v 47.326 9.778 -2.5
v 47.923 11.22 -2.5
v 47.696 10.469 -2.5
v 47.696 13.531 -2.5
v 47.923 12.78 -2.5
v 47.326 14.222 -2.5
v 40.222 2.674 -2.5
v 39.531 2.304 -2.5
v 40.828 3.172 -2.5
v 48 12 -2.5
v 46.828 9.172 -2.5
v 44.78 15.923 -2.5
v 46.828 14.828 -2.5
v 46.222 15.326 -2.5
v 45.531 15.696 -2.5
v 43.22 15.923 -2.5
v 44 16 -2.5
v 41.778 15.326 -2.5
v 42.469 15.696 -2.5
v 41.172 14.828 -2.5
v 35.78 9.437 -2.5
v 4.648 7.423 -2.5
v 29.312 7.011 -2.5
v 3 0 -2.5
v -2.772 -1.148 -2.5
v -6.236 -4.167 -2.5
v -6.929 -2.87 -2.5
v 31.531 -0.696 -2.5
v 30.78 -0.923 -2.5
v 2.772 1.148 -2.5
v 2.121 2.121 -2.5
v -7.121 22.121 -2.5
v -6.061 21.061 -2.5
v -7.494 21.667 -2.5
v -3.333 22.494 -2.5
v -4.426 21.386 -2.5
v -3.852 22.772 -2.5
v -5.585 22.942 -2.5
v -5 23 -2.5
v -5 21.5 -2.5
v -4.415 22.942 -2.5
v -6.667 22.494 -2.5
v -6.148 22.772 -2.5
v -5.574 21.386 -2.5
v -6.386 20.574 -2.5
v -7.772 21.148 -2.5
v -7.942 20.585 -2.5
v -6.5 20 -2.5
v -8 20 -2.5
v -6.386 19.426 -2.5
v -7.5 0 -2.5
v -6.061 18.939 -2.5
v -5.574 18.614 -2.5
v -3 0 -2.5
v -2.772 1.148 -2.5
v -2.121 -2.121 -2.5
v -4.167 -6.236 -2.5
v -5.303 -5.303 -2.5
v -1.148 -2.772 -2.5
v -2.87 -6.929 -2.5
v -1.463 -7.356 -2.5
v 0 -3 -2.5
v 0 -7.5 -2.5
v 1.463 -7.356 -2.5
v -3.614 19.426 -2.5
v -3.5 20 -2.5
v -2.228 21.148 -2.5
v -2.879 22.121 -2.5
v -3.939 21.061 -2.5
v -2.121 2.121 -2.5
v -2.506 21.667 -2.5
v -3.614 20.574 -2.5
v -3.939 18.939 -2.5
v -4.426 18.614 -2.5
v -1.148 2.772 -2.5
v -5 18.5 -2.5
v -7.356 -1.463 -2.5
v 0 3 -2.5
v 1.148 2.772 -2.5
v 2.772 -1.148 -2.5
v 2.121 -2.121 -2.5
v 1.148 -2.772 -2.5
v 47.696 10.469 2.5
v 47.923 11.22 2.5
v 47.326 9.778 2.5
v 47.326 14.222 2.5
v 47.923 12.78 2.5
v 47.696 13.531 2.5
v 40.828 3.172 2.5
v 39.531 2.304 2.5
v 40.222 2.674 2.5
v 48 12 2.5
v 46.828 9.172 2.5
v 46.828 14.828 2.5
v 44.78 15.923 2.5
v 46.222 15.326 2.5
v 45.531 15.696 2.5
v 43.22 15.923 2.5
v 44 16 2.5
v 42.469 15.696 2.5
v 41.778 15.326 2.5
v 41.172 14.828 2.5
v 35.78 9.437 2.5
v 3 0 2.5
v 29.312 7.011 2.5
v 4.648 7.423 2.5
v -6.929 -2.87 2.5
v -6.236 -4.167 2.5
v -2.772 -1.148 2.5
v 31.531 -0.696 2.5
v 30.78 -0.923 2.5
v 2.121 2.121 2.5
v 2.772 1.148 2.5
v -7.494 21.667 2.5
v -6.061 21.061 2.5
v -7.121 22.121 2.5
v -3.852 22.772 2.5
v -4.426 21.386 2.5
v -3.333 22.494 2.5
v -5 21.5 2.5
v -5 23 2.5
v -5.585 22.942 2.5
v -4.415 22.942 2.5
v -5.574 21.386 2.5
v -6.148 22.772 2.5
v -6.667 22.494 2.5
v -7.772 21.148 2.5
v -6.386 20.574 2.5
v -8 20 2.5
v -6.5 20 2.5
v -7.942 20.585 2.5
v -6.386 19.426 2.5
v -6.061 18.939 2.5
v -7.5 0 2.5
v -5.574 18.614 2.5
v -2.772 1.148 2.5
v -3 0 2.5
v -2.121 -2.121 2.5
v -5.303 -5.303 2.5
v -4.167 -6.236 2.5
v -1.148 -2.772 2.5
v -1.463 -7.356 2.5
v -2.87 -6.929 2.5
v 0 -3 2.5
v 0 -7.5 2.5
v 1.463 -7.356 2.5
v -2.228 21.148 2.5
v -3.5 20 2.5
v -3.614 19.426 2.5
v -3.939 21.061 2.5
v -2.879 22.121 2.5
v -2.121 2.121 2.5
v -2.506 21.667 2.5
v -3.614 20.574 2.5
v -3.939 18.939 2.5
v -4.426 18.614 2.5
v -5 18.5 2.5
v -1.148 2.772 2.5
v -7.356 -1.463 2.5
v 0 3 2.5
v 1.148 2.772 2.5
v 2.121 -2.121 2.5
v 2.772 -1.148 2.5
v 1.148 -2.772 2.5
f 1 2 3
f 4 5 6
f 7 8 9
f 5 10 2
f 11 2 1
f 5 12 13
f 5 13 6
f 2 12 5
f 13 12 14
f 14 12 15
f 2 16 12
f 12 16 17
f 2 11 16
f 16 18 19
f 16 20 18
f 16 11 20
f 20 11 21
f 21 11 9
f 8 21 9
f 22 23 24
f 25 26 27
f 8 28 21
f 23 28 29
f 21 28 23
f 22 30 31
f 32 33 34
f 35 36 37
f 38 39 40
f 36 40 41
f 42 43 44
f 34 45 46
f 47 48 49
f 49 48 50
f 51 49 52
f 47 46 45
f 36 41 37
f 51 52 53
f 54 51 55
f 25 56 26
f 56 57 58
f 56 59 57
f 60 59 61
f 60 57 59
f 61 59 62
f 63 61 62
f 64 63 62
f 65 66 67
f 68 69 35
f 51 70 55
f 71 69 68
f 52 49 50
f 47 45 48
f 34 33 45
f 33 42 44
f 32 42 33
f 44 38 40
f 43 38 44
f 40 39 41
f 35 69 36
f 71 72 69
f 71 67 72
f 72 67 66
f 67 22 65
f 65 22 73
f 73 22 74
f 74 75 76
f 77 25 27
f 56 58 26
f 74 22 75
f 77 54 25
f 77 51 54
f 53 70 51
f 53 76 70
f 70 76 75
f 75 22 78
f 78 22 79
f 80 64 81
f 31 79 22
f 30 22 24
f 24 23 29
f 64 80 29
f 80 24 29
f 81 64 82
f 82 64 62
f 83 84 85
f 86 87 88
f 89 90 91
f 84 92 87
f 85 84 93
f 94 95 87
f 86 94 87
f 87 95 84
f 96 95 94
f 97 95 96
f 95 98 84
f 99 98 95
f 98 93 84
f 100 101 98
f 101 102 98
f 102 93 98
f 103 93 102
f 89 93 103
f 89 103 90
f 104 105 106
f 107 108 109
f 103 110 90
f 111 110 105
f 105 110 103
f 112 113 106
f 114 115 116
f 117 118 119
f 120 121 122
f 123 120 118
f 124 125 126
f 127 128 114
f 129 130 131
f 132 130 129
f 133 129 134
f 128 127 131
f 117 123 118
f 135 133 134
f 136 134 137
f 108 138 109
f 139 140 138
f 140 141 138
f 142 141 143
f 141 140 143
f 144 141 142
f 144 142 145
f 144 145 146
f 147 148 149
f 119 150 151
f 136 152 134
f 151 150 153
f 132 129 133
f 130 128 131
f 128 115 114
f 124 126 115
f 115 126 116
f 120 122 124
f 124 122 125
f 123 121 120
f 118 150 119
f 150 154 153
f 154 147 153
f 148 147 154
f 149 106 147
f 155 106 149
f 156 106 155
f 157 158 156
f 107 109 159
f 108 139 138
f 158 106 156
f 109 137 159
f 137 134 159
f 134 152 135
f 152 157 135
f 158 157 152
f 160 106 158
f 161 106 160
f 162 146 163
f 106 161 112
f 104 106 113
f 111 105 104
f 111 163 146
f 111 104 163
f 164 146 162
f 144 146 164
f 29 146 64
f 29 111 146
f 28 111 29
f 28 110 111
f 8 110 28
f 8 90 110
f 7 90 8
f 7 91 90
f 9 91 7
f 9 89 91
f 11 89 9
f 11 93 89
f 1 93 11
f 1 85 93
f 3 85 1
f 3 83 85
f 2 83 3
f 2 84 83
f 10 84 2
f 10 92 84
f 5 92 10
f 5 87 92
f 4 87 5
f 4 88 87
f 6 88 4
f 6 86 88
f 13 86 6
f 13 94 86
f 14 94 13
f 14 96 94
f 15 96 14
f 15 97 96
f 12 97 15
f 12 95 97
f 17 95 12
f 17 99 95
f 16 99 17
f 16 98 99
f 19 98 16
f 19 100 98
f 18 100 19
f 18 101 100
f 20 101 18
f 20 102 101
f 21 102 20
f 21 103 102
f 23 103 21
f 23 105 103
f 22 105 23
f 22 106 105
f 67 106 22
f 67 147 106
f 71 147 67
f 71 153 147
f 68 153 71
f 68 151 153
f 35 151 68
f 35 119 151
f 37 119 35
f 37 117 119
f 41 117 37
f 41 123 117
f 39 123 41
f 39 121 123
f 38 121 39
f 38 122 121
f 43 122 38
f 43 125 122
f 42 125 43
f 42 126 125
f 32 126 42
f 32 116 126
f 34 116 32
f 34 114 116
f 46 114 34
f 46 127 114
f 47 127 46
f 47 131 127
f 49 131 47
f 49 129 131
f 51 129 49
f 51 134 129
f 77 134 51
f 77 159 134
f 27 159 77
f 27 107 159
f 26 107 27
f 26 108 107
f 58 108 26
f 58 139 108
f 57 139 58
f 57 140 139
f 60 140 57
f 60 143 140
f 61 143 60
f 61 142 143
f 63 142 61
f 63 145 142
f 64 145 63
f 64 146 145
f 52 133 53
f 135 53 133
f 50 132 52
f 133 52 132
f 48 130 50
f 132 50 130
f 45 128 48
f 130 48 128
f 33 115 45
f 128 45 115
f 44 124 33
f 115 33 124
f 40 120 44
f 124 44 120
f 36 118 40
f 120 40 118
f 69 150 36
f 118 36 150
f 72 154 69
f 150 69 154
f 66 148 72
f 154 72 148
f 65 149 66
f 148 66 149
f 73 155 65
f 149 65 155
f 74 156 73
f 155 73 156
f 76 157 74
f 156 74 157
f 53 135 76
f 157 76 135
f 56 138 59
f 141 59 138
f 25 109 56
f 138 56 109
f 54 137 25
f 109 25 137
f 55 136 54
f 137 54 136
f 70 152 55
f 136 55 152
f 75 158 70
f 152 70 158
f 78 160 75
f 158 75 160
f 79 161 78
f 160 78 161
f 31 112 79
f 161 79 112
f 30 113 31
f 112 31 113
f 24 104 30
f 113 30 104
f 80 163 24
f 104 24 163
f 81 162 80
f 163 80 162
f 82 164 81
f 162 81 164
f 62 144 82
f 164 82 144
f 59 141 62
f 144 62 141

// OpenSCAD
// file: config.scad
lever_thickness = 5;
layer_spacing = 4;

mount_thickness = 6;

pot_shaft_diameter = 6;
pot_mount_diameter = 8;

mount_screw_diameter = 3.5;
mount_screw_cutout_diameter = 5;
// file: lever.scad
include <config.scad>;

module HullPart(pa, pb, da, db)
{
  hull()
  {
    translate(pa)
    {
      circle(d=da, $fn=32);
    }

    translate(pb)
    {
      circle(d=db, $fn=32);
    }
  }
}

module Lever()
{
  pq = [-5, 20];
  pa = [0, 0];
  pb = [30, 3];
  pc = [38, 6];
  pd = [44, 12];

  dq = 6;
  da = 15;
  db = 8;
  dc = 8;
  dd = 8;

  difference()
  {
    union()
    {
      HullPart(pa, pq, da, dq);
      HullPart(pa, pb, da, db);
      HullPart(pb, pc, db, dc);
      HullPart(pc, pd, dc, dd);
    }

    translate(pa)
    {
      circle(d=pot_shaft_diameter, $fn=16);
    }

    translate(pq)
    {
      circle(d=3, $fn=16);
    }
  }
}

Lever();
// main file
use <lever.scad>;
include <config.scad>;

module Lever3D()
{
  linear_extrude(lever_thickness, center=true)
  {
    Lever();
  }
}

Lever3D();
